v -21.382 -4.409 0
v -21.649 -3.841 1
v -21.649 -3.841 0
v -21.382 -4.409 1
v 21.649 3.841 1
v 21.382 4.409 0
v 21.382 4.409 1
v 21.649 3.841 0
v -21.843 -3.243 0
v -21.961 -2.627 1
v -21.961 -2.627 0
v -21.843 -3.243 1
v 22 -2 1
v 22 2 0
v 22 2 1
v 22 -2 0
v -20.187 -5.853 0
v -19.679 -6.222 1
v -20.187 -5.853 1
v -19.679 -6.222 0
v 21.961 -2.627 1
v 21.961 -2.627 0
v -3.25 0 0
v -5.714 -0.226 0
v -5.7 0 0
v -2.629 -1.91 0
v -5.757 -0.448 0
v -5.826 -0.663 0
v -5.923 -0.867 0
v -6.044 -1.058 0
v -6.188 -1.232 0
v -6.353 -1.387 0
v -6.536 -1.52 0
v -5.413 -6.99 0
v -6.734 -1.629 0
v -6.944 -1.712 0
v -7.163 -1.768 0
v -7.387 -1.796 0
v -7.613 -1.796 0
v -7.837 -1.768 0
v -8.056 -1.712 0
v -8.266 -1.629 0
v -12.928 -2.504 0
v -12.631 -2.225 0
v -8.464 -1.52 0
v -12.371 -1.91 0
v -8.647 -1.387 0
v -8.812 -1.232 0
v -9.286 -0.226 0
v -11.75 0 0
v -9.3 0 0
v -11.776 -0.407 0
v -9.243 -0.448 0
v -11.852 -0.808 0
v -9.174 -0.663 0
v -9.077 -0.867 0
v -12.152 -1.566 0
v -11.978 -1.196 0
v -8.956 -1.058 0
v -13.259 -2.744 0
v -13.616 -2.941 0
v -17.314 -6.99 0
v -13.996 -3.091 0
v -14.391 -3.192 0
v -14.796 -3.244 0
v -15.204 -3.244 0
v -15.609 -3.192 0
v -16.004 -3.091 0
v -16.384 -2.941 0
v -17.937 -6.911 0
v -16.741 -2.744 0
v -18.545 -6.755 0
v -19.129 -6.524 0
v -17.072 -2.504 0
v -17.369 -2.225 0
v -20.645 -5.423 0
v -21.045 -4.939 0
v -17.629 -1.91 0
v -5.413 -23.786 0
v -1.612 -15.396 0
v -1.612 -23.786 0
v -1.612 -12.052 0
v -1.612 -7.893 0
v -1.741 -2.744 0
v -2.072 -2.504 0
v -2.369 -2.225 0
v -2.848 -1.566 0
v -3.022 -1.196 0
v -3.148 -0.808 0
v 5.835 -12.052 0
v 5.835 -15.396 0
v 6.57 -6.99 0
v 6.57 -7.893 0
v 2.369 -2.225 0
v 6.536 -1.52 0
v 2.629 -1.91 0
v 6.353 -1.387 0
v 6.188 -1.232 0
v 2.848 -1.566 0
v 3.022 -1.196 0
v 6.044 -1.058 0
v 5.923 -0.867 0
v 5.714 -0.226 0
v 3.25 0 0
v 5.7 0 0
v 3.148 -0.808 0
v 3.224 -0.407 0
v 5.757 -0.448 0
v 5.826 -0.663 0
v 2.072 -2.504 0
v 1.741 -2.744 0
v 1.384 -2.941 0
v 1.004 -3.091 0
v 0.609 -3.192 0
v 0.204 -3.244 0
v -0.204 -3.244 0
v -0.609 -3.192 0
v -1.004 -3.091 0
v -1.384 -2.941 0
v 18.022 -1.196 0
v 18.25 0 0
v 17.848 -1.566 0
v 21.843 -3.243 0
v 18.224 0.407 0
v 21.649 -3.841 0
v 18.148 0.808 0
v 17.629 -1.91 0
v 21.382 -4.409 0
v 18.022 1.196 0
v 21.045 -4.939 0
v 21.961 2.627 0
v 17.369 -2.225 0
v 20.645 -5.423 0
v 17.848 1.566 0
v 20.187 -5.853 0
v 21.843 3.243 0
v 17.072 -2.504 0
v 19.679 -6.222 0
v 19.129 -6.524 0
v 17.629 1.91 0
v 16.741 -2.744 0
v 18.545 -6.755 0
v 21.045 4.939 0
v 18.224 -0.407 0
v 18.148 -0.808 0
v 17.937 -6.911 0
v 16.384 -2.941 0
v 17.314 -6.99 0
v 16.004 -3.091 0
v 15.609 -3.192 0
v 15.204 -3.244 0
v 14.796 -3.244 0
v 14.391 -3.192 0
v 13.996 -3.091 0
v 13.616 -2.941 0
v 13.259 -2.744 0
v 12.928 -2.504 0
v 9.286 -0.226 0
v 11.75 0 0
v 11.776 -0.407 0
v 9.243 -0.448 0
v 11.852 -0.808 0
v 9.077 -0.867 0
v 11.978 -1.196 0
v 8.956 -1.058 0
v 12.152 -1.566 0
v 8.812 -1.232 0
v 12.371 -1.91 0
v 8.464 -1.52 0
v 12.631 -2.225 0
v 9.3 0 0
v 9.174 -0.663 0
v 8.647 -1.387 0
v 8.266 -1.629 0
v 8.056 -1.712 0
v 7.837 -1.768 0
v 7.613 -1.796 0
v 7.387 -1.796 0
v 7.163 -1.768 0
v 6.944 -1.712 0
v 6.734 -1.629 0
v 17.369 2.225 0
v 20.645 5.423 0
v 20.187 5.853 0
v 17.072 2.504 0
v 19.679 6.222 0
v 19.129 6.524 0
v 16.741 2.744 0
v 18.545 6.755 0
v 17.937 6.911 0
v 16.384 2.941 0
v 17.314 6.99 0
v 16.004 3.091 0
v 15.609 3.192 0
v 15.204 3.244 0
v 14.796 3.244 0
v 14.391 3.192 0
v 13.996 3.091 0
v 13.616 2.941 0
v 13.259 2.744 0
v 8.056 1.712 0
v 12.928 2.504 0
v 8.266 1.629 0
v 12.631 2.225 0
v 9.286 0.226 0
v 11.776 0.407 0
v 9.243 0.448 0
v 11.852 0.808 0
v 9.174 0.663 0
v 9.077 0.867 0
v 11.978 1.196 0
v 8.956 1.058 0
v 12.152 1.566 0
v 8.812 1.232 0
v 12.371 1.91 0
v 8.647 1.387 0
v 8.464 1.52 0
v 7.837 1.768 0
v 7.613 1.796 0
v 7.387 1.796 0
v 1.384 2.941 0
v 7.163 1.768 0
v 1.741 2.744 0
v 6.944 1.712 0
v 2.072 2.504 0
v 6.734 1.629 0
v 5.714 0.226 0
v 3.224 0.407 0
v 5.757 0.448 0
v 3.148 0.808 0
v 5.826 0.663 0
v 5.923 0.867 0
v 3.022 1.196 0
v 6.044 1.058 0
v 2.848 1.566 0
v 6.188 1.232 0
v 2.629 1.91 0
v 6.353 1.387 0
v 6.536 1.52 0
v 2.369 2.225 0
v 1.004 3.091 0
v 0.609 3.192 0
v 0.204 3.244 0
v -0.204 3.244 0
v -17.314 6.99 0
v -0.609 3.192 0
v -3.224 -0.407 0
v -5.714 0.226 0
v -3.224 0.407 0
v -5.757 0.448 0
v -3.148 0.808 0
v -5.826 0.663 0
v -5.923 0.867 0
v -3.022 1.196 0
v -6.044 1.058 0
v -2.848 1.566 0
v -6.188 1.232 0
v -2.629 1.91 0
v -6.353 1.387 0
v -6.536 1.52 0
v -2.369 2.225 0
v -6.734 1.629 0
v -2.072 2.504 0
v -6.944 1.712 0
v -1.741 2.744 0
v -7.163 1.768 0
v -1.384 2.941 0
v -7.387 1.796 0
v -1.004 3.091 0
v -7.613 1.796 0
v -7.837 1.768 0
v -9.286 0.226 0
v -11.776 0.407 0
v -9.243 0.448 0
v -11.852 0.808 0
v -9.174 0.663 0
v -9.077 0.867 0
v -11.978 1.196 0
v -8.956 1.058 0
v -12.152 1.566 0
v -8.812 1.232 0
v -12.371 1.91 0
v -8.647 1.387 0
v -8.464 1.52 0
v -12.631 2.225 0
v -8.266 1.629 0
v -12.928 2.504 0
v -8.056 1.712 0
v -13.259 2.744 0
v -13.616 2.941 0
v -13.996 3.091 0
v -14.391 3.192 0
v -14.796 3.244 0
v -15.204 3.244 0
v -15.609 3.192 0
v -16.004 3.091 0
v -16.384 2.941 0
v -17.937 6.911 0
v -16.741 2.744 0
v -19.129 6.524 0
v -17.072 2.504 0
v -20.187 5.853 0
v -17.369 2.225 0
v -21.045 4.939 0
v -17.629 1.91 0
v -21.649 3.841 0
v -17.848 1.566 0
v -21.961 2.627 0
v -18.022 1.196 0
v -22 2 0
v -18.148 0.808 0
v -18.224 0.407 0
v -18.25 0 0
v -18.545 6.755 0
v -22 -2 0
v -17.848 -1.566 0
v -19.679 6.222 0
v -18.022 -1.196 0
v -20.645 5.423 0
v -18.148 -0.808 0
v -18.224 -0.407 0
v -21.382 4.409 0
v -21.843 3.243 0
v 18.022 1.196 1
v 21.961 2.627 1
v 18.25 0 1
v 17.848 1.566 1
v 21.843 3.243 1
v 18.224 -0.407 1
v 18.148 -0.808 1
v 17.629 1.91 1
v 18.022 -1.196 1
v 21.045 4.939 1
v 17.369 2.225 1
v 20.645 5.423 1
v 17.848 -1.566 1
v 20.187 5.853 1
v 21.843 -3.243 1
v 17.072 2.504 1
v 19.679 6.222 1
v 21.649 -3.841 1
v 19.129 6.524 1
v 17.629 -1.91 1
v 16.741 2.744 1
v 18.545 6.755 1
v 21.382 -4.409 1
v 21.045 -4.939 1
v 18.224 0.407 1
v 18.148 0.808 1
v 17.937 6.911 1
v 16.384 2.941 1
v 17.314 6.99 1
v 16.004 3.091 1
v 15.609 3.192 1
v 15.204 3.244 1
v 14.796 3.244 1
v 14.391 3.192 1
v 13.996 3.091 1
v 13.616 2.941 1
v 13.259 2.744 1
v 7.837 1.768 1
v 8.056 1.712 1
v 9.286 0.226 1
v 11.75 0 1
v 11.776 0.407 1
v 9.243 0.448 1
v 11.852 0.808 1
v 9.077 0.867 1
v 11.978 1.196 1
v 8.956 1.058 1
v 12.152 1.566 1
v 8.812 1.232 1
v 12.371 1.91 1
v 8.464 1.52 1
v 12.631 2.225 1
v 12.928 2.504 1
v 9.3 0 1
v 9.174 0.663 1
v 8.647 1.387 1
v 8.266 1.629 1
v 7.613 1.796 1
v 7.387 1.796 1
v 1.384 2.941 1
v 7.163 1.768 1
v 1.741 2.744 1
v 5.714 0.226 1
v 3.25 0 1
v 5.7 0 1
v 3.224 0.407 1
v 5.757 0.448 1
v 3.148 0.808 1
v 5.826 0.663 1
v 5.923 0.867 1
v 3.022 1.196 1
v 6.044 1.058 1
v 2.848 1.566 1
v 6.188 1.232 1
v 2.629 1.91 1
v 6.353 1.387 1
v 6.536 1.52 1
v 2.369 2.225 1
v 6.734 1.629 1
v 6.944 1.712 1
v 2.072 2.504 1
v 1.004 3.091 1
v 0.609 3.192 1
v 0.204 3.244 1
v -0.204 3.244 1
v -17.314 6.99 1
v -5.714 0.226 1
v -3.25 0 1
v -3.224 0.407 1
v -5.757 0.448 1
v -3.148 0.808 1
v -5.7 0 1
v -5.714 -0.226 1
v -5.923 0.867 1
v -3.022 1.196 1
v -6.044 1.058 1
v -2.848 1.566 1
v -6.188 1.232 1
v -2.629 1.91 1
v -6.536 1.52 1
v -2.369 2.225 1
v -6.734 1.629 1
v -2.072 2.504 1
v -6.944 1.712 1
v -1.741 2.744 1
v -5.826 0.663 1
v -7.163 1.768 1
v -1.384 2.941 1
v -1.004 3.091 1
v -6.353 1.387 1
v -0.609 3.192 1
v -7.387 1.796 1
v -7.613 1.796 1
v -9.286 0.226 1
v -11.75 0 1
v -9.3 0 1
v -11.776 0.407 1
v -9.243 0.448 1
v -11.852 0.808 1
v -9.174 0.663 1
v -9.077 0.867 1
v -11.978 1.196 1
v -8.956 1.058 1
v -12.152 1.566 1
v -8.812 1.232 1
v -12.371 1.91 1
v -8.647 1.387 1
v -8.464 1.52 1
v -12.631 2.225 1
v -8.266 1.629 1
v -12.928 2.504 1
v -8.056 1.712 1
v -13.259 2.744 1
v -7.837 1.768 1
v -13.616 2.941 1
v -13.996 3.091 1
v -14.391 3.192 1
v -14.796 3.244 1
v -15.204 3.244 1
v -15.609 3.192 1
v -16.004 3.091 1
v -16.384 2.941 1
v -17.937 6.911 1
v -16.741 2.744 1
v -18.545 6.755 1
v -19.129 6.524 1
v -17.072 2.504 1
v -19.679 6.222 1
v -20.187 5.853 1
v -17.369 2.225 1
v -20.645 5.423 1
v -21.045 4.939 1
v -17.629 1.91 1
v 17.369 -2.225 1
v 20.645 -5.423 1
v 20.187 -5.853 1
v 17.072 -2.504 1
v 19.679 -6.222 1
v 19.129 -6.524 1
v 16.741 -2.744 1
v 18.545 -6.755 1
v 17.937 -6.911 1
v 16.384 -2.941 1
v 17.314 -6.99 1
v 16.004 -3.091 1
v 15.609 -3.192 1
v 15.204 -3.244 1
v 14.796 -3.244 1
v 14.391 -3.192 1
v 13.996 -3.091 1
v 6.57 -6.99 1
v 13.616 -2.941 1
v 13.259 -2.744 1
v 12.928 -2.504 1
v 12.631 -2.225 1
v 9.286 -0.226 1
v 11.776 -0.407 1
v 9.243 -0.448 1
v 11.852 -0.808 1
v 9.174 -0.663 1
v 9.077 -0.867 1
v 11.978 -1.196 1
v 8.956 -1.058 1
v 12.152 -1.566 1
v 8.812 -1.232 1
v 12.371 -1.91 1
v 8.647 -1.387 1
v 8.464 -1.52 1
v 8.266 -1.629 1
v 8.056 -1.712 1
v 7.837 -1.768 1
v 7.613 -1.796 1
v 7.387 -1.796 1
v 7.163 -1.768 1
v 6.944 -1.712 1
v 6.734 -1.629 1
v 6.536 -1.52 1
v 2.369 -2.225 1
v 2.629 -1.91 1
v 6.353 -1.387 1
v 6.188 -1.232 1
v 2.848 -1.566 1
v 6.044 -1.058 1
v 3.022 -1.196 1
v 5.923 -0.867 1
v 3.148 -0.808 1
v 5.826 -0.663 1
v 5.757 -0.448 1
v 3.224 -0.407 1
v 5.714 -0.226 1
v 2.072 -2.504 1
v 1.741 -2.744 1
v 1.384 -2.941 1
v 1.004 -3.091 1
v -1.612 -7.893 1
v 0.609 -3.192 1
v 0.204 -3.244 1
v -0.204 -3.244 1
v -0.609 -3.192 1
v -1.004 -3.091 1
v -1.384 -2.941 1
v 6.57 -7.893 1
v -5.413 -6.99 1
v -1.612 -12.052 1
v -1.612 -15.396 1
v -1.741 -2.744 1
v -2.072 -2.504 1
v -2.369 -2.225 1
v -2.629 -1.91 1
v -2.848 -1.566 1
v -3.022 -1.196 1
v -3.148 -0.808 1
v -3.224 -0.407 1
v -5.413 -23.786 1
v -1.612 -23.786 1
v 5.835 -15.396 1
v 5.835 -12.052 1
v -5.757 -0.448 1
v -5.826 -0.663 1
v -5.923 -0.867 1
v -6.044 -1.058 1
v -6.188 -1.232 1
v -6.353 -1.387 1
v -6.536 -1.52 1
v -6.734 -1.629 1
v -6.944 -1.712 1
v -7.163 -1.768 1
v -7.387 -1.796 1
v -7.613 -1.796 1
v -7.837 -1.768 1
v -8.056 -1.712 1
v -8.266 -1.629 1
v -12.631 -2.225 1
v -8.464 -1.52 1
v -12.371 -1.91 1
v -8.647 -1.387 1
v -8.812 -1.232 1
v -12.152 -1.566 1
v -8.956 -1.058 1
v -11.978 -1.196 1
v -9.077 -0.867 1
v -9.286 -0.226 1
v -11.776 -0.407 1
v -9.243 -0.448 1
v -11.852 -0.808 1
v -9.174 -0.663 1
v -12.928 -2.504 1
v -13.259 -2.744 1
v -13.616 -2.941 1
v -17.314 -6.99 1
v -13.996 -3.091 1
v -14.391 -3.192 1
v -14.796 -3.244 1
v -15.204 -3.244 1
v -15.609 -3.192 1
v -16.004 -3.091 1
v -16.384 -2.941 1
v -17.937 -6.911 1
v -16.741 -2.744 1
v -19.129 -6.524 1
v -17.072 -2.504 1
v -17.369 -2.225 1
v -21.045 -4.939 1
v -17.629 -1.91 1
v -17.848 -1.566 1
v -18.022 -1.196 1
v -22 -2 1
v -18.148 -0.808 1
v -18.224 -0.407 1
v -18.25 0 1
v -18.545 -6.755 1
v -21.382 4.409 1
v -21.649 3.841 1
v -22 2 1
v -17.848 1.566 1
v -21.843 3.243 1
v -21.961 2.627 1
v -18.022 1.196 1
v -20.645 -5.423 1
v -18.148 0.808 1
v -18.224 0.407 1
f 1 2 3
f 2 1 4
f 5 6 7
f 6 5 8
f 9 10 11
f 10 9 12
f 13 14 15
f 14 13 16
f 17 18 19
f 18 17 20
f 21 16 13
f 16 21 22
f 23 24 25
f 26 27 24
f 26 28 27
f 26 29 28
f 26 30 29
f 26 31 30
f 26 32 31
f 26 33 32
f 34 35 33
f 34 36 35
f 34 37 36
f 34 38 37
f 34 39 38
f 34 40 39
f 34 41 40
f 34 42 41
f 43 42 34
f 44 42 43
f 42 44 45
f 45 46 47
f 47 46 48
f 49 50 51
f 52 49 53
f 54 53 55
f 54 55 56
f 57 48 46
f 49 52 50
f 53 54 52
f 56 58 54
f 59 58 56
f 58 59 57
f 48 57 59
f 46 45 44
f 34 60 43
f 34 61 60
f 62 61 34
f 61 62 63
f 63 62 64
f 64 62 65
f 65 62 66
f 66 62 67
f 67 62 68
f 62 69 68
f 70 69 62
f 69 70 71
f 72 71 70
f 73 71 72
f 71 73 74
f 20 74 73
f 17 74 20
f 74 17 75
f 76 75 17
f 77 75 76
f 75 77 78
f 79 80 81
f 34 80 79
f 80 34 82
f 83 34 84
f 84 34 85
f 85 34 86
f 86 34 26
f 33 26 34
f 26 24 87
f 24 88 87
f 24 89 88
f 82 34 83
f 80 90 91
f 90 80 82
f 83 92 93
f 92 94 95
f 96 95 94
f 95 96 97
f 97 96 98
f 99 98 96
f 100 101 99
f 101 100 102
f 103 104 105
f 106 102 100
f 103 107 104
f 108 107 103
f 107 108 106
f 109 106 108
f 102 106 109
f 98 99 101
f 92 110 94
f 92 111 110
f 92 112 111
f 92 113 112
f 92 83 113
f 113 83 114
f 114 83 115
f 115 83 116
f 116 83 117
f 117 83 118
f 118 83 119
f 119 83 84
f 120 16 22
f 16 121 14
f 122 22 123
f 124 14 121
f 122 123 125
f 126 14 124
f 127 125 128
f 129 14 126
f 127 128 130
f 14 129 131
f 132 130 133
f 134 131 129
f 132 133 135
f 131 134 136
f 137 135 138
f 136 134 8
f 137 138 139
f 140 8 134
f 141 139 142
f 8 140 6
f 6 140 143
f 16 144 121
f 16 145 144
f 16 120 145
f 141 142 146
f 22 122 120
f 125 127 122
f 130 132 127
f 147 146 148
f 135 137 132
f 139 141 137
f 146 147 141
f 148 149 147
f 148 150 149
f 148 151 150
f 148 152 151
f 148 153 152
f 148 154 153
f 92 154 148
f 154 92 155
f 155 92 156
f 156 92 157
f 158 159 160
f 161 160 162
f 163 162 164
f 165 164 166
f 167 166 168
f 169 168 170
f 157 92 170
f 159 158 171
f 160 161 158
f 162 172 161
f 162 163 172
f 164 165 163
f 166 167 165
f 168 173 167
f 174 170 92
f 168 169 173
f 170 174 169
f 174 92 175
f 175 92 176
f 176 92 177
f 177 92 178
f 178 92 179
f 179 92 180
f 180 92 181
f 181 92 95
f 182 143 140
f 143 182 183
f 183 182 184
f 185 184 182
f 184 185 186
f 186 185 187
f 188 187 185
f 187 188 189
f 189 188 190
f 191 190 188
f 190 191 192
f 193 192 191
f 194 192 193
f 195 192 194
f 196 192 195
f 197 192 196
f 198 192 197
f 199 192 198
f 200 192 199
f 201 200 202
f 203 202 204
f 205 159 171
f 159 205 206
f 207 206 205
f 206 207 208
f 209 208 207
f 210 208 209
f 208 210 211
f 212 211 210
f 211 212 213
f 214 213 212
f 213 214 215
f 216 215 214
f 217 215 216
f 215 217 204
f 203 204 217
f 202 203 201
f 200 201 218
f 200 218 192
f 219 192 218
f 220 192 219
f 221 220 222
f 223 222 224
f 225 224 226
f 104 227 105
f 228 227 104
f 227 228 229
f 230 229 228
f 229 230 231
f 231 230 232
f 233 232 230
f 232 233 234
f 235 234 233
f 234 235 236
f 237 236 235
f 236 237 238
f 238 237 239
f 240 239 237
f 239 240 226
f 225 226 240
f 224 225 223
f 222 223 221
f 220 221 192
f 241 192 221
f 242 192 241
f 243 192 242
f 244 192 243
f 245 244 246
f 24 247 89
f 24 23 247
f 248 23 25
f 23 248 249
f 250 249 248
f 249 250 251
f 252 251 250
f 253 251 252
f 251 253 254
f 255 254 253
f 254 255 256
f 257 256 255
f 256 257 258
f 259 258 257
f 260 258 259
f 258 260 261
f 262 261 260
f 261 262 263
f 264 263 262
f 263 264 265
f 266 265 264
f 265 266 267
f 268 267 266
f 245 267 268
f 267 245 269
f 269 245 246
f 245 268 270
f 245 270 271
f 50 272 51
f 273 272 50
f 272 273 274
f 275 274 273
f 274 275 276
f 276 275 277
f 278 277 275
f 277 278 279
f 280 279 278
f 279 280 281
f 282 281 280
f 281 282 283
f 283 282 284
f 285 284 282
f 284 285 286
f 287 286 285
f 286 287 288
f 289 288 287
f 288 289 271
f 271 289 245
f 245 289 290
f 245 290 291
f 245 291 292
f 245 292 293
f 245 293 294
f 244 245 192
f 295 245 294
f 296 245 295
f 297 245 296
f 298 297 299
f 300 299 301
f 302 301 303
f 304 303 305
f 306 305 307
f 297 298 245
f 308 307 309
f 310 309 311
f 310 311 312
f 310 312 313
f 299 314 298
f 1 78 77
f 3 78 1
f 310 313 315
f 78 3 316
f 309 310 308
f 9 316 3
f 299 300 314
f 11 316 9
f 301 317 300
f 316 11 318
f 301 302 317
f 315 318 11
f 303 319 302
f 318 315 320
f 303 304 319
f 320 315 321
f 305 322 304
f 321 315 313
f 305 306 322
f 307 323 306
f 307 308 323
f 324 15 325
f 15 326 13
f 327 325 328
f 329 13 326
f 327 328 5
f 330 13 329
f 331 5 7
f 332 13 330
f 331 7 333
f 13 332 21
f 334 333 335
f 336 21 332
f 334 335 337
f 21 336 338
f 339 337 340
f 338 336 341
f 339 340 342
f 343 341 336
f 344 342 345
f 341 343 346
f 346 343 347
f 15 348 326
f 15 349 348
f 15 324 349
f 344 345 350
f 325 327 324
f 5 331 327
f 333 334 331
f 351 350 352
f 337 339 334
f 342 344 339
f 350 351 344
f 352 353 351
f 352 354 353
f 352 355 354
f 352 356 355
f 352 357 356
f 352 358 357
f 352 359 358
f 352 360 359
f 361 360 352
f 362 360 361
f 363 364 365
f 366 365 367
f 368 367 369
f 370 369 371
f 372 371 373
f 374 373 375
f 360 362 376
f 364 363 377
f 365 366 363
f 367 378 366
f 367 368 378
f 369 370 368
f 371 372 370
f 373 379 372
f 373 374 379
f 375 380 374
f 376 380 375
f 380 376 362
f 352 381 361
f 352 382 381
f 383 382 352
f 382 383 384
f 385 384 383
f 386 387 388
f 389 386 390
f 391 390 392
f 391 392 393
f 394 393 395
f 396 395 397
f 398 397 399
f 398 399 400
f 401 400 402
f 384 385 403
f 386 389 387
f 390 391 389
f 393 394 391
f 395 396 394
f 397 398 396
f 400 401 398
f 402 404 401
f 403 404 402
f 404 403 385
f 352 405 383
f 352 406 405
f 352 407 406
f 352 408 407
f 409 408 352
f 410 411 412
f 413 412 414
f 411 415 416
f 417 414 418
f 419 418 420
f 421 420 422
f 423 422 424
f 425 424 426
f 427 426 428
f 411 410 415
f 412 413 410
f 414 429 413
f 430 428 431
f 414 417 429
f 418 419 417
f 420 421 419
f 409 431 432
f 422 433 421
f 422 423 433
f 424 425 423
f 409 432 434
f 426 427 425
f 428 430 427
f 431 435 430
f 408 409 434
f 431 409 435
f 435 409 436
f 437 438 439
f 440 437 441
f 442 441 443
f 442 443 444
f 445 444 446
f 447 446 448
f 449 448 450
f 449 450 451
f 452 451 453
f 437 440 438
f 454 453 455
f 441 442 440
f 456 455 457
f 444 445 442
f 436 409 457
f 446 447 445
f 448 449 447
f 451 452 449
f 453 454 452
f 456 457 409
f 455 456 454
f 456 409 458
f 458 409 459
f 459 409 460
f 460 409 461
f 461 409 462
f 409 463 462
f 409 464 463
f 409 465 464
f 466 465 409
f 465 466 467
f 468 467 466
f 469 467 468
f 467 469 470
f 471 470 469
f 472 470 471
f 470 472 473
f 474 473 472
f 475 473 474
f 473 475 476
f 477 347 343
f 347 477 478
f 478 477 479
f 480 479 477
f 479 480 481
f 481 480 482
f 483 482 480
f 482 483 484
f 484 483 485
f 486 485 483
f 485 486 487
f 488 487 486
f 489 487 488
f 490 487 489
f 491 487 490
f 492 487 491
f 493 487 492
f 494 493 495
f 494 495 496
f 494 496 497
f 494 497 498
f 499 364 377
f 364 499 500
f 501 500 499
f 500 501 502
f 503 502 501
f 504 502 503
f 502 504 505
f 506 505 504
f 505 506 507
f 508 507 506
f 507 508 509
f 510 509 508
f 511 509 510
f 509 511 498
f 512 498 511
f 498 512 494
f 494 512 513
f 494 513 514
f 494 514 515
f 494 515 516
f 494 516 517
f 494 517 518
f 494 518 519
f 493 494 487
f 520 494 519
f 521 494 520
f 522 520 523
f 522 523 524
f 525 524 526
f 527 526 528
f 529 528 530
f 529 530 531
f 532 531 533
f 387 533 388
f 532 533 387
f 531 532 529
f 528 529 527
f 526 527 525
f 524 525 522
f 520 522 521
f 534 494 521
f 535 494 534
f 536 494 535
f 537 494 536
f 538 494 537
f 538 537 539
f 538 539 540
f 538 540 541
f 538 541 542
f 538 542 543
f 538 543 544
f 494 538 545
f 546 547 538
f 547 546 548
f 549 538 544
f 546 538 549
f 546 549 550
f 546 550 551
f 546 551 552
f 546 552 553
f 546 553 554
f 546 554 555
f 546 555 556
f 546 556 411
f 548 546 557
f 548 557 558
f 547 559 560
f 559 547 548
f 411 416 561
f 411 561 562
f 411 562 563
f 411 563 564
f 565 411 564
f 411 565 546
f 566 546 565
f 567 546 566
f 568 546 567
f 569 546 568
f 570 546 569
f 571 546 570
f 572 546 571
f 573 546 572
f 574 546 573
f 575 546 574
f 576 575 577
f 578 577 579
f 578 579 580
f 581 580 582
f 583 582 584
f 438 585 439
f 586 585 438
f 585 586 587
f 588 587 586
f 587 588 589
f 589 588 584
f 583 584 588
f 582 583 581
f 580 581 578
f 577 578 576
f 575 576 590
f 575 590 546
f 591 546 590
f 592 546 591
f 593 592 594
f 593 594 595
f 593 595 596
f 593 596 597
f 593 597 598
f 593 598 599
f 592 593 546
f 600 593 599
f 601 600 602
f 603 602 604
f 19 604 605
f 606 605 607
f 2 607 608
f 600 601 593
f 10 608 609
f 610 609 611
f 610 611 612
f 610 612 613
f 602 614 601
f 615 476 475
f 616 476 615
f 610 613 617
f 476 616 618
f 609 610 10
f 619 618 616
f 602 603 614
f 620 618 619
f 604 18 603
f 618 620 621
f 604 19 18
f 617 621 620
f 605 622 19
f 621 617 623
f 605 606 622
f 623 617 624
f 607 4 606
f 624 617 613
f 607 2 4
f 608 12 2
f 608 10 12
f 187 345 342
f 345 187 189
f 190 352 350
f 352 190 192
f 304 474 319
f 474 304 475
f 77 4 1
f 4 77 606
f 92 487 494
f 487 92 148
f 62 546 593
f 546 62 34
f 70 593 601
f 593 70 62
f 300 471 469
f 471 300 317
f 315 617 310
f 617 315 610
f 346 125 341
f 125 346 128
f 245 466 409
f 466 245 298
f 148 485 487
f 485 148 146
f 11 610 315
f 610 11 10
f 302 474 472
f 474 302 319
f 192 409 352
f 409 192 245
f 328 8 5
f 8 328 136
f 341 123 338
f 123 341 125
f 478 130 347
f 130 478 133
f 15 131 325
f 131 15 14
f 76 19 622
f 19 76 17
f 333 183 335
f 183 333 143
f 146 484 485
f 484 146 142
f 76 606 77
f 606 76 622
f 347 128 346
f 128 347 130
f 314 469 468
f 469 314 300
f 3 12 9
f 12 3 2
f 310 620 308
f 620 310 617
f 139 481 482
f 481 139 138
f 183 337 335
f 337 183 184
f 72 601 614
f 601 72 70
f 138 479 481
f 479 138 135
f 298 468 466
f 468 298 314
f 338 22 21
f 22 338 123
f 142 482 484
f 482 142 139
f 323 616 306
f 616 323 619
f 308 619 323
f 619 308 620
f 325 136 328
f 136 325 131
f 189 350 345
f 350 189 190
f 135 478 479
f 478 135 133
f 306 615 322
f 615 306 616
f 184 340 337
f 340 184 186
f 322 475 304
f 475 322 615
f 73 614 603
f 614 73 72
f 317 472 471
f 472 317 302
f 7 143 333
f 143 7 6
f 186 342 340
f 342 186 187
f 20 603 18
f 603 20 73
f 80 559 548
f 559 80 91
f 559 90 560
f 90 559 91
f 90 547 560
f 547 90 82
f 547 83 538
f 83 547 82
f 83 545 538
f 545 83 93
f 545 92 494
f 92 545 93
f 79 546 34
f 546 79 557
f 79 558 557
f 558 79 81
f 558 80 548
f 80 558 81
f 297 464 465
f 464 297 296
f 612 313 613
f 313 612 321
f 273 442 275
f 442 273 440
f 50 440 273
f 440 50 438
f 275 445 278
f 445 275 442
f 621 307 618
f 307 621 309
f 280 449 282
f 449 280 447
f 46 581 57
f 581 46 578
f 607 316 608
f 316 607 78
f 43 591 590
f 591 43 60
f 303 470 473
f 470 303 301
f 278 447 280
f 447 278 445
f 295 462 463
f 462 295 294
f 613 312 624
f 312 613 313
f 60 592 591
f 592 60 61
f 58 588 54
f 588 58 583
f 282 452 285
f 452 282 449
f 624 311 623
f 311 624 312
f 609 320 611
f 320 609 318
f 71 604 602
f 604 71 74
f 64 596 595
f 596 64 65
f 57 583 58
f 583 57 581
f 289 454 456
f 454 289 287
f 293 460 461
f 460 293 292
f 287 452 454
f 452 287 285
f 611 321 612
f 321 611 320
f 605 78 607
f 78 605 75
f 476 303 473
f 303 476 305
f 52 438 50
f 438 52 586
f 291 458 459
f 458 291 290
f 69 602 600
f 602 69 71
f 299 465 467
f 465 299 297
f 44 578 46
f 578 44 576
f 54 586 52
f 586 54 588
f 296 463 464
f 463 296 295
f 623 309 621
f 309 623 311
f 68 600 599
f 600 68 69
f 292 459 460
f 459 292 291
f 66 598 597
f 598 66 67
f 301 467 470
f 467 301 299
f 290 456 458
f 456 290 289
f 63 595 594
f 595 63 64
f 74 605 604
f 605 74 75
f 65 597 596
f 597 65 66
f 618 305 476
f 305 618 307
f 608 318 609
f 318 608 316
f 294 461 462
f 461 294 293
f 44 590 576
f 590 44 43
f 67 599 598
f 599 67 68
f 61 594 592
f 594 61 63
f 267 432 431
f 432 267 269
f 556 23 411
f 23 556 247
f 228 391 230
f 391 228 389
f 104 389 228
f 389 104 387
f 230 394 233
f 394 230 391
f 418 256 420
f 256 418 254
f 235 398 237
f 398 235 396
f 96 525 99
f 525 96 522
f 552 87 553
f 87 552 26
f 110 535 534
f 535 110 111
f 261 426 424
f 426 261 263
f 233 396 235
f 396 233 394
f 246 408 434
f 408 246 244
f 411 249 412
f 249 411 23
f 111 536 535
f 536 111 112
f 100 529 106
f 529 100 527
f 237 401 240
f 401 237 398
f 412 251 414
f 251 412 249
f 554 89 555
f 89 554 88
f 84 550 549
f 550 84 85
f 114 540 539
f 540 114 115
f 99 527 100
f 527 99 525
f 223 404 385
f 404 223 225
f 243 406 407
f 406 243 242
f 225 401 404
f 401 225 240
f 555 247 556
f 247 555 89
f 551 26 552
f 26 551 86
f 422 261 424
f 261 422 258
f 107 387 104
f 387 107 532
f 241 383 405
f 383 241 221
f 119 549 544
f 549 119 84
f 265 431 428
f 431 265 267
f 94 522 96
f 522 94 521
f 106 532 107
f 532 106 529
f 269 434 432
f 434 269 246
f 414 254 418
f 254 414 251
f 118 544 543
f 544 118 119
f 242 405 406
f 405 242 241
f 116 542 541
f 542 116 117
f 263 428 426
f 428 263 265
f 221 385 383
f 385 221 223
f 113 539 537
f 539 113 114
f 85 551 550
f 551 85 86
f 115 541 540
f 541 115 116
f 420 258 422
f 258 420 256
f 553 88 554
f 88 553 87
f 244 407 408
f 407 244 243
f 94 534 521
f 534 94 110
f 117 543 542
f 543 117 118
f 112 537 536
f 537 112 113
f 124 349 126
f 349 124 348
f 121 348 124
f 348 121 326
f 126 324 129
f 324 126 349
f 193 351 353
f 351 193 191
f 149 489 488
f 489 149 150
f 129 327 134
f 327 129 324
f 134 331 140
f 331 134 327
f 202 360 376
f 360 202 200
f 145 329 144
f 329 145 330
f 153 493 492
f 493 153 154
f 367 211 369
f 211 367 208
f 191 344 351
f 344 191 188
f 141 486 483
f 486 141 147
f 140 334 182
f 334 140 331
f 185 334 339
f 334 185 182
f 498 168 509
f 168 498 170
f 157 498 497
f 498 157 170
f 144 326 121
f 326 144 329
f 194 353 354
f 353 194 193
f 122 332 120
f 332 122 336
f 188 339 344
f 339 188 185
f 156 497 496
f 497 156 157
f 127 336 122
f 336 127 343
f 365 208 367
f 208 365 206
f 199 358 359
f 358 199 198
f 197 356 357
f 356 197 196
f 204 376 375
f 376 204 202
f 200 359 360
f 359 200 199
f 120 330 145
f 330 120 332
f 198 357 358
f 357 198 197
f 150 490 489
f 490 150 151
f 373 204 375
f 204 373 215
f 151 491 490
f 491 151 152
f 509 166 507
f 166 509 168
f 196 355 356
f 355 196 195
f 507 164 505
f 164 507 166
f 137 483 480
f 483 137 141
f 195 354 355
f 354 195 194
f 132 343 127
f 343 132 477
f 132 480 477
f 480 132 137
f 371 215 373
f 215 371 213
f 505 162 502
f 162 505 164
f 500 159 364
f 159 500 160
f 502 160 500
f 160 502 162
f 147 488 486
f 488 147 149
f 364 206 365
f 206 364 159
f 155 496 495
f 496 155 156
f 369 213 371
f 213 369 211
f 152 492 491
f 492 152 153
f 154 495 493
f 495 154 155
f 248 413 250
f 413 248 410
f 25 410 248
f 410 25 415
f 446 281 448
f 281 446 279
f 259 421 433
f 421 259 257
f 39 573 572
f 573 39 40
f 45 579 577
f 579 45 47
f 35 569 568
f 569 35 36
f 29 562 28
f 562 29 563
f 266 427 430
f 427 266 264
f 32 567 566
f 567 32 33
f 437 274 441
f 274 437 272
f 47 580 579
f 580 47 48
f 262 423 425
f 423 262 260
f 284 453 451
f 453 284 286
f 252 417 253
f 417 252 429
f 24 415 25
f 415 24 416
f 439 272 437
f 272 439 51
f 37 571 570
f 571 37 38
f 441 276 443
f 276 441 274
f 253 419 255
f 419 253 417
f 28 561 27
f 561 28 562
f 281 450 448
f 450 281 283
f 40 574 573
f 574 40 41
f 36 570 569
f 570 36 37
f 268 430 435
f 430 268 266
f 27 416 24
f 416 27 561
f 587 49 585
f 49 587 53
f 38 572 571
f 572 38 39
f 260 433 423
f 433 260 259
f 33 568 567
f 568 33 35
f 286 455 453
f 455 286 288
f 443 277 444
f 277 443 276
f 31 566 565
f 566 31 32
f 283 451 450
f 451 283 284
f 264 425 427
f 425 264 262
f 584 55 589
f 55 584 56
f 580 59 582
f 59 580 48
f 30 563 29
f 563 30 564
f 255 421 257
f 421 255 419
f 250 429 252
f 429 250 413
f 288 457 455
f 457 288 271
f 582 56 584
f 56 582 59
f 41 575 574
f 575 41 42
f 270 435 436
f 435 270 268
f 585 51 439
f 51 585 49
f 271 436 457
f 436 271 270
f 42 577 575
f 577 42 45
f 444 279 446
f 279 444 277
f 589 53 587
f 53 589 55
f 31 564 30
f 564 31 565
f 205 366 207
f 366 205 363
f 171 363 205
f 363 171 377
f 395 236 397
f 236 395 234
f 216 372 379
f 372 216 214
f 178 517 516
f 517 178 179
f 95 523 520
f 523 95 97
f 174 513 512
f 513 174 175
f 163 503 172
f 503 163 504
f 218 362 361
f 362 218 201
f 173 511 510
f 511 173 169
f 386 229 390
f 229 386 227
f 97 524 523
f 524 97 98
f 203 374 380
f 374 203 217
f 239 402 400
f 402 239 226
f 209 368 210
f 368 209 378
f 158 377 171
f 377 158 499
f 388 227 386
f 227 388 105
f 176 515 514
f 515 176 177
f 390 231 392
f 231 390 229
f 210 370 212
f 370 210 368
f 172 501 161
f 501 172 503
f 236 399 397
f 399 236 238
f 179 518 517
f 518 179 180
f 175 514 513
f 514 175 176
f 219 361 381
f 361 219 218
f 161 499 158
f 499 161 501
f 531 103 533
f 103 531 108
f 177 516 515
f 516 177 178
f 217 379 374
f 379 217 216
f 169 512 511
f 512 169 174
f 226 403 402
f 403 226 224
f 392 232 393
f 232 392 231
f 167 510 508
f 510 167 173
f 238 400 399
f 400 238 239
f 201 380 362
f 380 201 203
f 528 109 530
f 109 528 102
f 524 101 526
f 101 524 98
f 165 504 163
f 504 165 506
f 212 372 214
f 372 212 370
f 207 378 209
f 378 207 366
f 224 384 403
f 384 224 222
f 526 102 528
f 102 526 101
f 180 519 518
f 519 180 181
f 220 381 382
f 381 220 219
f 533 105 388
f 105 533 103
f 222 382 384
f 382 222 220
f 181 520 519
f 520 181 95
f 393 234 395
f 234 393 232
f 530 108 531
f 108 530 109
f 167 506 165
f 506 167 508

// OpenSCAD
$fn = 50;


difference() {
	union() {
		hull() {
			translate(v = [-17.0000000000, 2.0000000000, 0]) {
				cylinder(h = 1, r = 5);
			}
			translate(v = [17.0000000000, 2.0000000000, 0]) {
				cylinder(h = 1, r = 5);
			}
			translate(v = [-17.0000000000, -2.0000000000, 0]) {
				cylinder(h = 1, r = 5);
			}
			translate(v = [17.0000000000, -2.0000000000, 0]) {
				cylinder(h = 1, r = 5);
			}
		}
		translate(v = [0, -5, 0]) {
			linear_extrude(height = 1) {
				text(font = "DejaVu Sans Mono:style=Bold", halign = "center", size = 19.0000000000, text = "F", valign = "top");
			}
		}
	}
	union() {
		translate(v = [-15.0000000000, 0.0000000000, 0]) {
			translate(v = [0, 0, -100]) {
				cylinder(h = 200, r = 3.2500000000);
			}
		}
		translate(v = [0, 0, -100]) {
			cylinder(h = 200, r = 3.2500000000);
		}
		translate(v = [15.0000000000, 0.0000000000, 0]) {
			translate(v = [0, 0, -100]) {
				cylinder(h = 200, r = 3.2500000000);
			}
		}
		translate(v = [-15.0000000000, 0.0000000000, 0]) {
			translate(v = [0, 0, -100]) {
				cylinder(h = 200, r = 1.8000000000);
			}
		}
		translate(v = [-7.5000000000, 0.0000000000, 0]) {
			translate(v = [0, 0, -100]) {
				cylinder(h = 200, r = 1.8000000000);
			}
		}
		translate(v = [0, 0, -100]) {
			cylinder(h = 200, r = 1.8000000000);
		}
		translate(v = [7.5000000000, 0.0000000000, 0]) {
			translate(v = [0, 0, -100]) {
				cylinder(h = 200, r = 1.8000000000);
			}
		}
		translate(v = [15.0000000000, 0.0000000000, 0]) {
			translate(v = [0, 0, -100]) {
				cylinder(h = 200, r = 1.8000000000);
			}
		}
	}
}
